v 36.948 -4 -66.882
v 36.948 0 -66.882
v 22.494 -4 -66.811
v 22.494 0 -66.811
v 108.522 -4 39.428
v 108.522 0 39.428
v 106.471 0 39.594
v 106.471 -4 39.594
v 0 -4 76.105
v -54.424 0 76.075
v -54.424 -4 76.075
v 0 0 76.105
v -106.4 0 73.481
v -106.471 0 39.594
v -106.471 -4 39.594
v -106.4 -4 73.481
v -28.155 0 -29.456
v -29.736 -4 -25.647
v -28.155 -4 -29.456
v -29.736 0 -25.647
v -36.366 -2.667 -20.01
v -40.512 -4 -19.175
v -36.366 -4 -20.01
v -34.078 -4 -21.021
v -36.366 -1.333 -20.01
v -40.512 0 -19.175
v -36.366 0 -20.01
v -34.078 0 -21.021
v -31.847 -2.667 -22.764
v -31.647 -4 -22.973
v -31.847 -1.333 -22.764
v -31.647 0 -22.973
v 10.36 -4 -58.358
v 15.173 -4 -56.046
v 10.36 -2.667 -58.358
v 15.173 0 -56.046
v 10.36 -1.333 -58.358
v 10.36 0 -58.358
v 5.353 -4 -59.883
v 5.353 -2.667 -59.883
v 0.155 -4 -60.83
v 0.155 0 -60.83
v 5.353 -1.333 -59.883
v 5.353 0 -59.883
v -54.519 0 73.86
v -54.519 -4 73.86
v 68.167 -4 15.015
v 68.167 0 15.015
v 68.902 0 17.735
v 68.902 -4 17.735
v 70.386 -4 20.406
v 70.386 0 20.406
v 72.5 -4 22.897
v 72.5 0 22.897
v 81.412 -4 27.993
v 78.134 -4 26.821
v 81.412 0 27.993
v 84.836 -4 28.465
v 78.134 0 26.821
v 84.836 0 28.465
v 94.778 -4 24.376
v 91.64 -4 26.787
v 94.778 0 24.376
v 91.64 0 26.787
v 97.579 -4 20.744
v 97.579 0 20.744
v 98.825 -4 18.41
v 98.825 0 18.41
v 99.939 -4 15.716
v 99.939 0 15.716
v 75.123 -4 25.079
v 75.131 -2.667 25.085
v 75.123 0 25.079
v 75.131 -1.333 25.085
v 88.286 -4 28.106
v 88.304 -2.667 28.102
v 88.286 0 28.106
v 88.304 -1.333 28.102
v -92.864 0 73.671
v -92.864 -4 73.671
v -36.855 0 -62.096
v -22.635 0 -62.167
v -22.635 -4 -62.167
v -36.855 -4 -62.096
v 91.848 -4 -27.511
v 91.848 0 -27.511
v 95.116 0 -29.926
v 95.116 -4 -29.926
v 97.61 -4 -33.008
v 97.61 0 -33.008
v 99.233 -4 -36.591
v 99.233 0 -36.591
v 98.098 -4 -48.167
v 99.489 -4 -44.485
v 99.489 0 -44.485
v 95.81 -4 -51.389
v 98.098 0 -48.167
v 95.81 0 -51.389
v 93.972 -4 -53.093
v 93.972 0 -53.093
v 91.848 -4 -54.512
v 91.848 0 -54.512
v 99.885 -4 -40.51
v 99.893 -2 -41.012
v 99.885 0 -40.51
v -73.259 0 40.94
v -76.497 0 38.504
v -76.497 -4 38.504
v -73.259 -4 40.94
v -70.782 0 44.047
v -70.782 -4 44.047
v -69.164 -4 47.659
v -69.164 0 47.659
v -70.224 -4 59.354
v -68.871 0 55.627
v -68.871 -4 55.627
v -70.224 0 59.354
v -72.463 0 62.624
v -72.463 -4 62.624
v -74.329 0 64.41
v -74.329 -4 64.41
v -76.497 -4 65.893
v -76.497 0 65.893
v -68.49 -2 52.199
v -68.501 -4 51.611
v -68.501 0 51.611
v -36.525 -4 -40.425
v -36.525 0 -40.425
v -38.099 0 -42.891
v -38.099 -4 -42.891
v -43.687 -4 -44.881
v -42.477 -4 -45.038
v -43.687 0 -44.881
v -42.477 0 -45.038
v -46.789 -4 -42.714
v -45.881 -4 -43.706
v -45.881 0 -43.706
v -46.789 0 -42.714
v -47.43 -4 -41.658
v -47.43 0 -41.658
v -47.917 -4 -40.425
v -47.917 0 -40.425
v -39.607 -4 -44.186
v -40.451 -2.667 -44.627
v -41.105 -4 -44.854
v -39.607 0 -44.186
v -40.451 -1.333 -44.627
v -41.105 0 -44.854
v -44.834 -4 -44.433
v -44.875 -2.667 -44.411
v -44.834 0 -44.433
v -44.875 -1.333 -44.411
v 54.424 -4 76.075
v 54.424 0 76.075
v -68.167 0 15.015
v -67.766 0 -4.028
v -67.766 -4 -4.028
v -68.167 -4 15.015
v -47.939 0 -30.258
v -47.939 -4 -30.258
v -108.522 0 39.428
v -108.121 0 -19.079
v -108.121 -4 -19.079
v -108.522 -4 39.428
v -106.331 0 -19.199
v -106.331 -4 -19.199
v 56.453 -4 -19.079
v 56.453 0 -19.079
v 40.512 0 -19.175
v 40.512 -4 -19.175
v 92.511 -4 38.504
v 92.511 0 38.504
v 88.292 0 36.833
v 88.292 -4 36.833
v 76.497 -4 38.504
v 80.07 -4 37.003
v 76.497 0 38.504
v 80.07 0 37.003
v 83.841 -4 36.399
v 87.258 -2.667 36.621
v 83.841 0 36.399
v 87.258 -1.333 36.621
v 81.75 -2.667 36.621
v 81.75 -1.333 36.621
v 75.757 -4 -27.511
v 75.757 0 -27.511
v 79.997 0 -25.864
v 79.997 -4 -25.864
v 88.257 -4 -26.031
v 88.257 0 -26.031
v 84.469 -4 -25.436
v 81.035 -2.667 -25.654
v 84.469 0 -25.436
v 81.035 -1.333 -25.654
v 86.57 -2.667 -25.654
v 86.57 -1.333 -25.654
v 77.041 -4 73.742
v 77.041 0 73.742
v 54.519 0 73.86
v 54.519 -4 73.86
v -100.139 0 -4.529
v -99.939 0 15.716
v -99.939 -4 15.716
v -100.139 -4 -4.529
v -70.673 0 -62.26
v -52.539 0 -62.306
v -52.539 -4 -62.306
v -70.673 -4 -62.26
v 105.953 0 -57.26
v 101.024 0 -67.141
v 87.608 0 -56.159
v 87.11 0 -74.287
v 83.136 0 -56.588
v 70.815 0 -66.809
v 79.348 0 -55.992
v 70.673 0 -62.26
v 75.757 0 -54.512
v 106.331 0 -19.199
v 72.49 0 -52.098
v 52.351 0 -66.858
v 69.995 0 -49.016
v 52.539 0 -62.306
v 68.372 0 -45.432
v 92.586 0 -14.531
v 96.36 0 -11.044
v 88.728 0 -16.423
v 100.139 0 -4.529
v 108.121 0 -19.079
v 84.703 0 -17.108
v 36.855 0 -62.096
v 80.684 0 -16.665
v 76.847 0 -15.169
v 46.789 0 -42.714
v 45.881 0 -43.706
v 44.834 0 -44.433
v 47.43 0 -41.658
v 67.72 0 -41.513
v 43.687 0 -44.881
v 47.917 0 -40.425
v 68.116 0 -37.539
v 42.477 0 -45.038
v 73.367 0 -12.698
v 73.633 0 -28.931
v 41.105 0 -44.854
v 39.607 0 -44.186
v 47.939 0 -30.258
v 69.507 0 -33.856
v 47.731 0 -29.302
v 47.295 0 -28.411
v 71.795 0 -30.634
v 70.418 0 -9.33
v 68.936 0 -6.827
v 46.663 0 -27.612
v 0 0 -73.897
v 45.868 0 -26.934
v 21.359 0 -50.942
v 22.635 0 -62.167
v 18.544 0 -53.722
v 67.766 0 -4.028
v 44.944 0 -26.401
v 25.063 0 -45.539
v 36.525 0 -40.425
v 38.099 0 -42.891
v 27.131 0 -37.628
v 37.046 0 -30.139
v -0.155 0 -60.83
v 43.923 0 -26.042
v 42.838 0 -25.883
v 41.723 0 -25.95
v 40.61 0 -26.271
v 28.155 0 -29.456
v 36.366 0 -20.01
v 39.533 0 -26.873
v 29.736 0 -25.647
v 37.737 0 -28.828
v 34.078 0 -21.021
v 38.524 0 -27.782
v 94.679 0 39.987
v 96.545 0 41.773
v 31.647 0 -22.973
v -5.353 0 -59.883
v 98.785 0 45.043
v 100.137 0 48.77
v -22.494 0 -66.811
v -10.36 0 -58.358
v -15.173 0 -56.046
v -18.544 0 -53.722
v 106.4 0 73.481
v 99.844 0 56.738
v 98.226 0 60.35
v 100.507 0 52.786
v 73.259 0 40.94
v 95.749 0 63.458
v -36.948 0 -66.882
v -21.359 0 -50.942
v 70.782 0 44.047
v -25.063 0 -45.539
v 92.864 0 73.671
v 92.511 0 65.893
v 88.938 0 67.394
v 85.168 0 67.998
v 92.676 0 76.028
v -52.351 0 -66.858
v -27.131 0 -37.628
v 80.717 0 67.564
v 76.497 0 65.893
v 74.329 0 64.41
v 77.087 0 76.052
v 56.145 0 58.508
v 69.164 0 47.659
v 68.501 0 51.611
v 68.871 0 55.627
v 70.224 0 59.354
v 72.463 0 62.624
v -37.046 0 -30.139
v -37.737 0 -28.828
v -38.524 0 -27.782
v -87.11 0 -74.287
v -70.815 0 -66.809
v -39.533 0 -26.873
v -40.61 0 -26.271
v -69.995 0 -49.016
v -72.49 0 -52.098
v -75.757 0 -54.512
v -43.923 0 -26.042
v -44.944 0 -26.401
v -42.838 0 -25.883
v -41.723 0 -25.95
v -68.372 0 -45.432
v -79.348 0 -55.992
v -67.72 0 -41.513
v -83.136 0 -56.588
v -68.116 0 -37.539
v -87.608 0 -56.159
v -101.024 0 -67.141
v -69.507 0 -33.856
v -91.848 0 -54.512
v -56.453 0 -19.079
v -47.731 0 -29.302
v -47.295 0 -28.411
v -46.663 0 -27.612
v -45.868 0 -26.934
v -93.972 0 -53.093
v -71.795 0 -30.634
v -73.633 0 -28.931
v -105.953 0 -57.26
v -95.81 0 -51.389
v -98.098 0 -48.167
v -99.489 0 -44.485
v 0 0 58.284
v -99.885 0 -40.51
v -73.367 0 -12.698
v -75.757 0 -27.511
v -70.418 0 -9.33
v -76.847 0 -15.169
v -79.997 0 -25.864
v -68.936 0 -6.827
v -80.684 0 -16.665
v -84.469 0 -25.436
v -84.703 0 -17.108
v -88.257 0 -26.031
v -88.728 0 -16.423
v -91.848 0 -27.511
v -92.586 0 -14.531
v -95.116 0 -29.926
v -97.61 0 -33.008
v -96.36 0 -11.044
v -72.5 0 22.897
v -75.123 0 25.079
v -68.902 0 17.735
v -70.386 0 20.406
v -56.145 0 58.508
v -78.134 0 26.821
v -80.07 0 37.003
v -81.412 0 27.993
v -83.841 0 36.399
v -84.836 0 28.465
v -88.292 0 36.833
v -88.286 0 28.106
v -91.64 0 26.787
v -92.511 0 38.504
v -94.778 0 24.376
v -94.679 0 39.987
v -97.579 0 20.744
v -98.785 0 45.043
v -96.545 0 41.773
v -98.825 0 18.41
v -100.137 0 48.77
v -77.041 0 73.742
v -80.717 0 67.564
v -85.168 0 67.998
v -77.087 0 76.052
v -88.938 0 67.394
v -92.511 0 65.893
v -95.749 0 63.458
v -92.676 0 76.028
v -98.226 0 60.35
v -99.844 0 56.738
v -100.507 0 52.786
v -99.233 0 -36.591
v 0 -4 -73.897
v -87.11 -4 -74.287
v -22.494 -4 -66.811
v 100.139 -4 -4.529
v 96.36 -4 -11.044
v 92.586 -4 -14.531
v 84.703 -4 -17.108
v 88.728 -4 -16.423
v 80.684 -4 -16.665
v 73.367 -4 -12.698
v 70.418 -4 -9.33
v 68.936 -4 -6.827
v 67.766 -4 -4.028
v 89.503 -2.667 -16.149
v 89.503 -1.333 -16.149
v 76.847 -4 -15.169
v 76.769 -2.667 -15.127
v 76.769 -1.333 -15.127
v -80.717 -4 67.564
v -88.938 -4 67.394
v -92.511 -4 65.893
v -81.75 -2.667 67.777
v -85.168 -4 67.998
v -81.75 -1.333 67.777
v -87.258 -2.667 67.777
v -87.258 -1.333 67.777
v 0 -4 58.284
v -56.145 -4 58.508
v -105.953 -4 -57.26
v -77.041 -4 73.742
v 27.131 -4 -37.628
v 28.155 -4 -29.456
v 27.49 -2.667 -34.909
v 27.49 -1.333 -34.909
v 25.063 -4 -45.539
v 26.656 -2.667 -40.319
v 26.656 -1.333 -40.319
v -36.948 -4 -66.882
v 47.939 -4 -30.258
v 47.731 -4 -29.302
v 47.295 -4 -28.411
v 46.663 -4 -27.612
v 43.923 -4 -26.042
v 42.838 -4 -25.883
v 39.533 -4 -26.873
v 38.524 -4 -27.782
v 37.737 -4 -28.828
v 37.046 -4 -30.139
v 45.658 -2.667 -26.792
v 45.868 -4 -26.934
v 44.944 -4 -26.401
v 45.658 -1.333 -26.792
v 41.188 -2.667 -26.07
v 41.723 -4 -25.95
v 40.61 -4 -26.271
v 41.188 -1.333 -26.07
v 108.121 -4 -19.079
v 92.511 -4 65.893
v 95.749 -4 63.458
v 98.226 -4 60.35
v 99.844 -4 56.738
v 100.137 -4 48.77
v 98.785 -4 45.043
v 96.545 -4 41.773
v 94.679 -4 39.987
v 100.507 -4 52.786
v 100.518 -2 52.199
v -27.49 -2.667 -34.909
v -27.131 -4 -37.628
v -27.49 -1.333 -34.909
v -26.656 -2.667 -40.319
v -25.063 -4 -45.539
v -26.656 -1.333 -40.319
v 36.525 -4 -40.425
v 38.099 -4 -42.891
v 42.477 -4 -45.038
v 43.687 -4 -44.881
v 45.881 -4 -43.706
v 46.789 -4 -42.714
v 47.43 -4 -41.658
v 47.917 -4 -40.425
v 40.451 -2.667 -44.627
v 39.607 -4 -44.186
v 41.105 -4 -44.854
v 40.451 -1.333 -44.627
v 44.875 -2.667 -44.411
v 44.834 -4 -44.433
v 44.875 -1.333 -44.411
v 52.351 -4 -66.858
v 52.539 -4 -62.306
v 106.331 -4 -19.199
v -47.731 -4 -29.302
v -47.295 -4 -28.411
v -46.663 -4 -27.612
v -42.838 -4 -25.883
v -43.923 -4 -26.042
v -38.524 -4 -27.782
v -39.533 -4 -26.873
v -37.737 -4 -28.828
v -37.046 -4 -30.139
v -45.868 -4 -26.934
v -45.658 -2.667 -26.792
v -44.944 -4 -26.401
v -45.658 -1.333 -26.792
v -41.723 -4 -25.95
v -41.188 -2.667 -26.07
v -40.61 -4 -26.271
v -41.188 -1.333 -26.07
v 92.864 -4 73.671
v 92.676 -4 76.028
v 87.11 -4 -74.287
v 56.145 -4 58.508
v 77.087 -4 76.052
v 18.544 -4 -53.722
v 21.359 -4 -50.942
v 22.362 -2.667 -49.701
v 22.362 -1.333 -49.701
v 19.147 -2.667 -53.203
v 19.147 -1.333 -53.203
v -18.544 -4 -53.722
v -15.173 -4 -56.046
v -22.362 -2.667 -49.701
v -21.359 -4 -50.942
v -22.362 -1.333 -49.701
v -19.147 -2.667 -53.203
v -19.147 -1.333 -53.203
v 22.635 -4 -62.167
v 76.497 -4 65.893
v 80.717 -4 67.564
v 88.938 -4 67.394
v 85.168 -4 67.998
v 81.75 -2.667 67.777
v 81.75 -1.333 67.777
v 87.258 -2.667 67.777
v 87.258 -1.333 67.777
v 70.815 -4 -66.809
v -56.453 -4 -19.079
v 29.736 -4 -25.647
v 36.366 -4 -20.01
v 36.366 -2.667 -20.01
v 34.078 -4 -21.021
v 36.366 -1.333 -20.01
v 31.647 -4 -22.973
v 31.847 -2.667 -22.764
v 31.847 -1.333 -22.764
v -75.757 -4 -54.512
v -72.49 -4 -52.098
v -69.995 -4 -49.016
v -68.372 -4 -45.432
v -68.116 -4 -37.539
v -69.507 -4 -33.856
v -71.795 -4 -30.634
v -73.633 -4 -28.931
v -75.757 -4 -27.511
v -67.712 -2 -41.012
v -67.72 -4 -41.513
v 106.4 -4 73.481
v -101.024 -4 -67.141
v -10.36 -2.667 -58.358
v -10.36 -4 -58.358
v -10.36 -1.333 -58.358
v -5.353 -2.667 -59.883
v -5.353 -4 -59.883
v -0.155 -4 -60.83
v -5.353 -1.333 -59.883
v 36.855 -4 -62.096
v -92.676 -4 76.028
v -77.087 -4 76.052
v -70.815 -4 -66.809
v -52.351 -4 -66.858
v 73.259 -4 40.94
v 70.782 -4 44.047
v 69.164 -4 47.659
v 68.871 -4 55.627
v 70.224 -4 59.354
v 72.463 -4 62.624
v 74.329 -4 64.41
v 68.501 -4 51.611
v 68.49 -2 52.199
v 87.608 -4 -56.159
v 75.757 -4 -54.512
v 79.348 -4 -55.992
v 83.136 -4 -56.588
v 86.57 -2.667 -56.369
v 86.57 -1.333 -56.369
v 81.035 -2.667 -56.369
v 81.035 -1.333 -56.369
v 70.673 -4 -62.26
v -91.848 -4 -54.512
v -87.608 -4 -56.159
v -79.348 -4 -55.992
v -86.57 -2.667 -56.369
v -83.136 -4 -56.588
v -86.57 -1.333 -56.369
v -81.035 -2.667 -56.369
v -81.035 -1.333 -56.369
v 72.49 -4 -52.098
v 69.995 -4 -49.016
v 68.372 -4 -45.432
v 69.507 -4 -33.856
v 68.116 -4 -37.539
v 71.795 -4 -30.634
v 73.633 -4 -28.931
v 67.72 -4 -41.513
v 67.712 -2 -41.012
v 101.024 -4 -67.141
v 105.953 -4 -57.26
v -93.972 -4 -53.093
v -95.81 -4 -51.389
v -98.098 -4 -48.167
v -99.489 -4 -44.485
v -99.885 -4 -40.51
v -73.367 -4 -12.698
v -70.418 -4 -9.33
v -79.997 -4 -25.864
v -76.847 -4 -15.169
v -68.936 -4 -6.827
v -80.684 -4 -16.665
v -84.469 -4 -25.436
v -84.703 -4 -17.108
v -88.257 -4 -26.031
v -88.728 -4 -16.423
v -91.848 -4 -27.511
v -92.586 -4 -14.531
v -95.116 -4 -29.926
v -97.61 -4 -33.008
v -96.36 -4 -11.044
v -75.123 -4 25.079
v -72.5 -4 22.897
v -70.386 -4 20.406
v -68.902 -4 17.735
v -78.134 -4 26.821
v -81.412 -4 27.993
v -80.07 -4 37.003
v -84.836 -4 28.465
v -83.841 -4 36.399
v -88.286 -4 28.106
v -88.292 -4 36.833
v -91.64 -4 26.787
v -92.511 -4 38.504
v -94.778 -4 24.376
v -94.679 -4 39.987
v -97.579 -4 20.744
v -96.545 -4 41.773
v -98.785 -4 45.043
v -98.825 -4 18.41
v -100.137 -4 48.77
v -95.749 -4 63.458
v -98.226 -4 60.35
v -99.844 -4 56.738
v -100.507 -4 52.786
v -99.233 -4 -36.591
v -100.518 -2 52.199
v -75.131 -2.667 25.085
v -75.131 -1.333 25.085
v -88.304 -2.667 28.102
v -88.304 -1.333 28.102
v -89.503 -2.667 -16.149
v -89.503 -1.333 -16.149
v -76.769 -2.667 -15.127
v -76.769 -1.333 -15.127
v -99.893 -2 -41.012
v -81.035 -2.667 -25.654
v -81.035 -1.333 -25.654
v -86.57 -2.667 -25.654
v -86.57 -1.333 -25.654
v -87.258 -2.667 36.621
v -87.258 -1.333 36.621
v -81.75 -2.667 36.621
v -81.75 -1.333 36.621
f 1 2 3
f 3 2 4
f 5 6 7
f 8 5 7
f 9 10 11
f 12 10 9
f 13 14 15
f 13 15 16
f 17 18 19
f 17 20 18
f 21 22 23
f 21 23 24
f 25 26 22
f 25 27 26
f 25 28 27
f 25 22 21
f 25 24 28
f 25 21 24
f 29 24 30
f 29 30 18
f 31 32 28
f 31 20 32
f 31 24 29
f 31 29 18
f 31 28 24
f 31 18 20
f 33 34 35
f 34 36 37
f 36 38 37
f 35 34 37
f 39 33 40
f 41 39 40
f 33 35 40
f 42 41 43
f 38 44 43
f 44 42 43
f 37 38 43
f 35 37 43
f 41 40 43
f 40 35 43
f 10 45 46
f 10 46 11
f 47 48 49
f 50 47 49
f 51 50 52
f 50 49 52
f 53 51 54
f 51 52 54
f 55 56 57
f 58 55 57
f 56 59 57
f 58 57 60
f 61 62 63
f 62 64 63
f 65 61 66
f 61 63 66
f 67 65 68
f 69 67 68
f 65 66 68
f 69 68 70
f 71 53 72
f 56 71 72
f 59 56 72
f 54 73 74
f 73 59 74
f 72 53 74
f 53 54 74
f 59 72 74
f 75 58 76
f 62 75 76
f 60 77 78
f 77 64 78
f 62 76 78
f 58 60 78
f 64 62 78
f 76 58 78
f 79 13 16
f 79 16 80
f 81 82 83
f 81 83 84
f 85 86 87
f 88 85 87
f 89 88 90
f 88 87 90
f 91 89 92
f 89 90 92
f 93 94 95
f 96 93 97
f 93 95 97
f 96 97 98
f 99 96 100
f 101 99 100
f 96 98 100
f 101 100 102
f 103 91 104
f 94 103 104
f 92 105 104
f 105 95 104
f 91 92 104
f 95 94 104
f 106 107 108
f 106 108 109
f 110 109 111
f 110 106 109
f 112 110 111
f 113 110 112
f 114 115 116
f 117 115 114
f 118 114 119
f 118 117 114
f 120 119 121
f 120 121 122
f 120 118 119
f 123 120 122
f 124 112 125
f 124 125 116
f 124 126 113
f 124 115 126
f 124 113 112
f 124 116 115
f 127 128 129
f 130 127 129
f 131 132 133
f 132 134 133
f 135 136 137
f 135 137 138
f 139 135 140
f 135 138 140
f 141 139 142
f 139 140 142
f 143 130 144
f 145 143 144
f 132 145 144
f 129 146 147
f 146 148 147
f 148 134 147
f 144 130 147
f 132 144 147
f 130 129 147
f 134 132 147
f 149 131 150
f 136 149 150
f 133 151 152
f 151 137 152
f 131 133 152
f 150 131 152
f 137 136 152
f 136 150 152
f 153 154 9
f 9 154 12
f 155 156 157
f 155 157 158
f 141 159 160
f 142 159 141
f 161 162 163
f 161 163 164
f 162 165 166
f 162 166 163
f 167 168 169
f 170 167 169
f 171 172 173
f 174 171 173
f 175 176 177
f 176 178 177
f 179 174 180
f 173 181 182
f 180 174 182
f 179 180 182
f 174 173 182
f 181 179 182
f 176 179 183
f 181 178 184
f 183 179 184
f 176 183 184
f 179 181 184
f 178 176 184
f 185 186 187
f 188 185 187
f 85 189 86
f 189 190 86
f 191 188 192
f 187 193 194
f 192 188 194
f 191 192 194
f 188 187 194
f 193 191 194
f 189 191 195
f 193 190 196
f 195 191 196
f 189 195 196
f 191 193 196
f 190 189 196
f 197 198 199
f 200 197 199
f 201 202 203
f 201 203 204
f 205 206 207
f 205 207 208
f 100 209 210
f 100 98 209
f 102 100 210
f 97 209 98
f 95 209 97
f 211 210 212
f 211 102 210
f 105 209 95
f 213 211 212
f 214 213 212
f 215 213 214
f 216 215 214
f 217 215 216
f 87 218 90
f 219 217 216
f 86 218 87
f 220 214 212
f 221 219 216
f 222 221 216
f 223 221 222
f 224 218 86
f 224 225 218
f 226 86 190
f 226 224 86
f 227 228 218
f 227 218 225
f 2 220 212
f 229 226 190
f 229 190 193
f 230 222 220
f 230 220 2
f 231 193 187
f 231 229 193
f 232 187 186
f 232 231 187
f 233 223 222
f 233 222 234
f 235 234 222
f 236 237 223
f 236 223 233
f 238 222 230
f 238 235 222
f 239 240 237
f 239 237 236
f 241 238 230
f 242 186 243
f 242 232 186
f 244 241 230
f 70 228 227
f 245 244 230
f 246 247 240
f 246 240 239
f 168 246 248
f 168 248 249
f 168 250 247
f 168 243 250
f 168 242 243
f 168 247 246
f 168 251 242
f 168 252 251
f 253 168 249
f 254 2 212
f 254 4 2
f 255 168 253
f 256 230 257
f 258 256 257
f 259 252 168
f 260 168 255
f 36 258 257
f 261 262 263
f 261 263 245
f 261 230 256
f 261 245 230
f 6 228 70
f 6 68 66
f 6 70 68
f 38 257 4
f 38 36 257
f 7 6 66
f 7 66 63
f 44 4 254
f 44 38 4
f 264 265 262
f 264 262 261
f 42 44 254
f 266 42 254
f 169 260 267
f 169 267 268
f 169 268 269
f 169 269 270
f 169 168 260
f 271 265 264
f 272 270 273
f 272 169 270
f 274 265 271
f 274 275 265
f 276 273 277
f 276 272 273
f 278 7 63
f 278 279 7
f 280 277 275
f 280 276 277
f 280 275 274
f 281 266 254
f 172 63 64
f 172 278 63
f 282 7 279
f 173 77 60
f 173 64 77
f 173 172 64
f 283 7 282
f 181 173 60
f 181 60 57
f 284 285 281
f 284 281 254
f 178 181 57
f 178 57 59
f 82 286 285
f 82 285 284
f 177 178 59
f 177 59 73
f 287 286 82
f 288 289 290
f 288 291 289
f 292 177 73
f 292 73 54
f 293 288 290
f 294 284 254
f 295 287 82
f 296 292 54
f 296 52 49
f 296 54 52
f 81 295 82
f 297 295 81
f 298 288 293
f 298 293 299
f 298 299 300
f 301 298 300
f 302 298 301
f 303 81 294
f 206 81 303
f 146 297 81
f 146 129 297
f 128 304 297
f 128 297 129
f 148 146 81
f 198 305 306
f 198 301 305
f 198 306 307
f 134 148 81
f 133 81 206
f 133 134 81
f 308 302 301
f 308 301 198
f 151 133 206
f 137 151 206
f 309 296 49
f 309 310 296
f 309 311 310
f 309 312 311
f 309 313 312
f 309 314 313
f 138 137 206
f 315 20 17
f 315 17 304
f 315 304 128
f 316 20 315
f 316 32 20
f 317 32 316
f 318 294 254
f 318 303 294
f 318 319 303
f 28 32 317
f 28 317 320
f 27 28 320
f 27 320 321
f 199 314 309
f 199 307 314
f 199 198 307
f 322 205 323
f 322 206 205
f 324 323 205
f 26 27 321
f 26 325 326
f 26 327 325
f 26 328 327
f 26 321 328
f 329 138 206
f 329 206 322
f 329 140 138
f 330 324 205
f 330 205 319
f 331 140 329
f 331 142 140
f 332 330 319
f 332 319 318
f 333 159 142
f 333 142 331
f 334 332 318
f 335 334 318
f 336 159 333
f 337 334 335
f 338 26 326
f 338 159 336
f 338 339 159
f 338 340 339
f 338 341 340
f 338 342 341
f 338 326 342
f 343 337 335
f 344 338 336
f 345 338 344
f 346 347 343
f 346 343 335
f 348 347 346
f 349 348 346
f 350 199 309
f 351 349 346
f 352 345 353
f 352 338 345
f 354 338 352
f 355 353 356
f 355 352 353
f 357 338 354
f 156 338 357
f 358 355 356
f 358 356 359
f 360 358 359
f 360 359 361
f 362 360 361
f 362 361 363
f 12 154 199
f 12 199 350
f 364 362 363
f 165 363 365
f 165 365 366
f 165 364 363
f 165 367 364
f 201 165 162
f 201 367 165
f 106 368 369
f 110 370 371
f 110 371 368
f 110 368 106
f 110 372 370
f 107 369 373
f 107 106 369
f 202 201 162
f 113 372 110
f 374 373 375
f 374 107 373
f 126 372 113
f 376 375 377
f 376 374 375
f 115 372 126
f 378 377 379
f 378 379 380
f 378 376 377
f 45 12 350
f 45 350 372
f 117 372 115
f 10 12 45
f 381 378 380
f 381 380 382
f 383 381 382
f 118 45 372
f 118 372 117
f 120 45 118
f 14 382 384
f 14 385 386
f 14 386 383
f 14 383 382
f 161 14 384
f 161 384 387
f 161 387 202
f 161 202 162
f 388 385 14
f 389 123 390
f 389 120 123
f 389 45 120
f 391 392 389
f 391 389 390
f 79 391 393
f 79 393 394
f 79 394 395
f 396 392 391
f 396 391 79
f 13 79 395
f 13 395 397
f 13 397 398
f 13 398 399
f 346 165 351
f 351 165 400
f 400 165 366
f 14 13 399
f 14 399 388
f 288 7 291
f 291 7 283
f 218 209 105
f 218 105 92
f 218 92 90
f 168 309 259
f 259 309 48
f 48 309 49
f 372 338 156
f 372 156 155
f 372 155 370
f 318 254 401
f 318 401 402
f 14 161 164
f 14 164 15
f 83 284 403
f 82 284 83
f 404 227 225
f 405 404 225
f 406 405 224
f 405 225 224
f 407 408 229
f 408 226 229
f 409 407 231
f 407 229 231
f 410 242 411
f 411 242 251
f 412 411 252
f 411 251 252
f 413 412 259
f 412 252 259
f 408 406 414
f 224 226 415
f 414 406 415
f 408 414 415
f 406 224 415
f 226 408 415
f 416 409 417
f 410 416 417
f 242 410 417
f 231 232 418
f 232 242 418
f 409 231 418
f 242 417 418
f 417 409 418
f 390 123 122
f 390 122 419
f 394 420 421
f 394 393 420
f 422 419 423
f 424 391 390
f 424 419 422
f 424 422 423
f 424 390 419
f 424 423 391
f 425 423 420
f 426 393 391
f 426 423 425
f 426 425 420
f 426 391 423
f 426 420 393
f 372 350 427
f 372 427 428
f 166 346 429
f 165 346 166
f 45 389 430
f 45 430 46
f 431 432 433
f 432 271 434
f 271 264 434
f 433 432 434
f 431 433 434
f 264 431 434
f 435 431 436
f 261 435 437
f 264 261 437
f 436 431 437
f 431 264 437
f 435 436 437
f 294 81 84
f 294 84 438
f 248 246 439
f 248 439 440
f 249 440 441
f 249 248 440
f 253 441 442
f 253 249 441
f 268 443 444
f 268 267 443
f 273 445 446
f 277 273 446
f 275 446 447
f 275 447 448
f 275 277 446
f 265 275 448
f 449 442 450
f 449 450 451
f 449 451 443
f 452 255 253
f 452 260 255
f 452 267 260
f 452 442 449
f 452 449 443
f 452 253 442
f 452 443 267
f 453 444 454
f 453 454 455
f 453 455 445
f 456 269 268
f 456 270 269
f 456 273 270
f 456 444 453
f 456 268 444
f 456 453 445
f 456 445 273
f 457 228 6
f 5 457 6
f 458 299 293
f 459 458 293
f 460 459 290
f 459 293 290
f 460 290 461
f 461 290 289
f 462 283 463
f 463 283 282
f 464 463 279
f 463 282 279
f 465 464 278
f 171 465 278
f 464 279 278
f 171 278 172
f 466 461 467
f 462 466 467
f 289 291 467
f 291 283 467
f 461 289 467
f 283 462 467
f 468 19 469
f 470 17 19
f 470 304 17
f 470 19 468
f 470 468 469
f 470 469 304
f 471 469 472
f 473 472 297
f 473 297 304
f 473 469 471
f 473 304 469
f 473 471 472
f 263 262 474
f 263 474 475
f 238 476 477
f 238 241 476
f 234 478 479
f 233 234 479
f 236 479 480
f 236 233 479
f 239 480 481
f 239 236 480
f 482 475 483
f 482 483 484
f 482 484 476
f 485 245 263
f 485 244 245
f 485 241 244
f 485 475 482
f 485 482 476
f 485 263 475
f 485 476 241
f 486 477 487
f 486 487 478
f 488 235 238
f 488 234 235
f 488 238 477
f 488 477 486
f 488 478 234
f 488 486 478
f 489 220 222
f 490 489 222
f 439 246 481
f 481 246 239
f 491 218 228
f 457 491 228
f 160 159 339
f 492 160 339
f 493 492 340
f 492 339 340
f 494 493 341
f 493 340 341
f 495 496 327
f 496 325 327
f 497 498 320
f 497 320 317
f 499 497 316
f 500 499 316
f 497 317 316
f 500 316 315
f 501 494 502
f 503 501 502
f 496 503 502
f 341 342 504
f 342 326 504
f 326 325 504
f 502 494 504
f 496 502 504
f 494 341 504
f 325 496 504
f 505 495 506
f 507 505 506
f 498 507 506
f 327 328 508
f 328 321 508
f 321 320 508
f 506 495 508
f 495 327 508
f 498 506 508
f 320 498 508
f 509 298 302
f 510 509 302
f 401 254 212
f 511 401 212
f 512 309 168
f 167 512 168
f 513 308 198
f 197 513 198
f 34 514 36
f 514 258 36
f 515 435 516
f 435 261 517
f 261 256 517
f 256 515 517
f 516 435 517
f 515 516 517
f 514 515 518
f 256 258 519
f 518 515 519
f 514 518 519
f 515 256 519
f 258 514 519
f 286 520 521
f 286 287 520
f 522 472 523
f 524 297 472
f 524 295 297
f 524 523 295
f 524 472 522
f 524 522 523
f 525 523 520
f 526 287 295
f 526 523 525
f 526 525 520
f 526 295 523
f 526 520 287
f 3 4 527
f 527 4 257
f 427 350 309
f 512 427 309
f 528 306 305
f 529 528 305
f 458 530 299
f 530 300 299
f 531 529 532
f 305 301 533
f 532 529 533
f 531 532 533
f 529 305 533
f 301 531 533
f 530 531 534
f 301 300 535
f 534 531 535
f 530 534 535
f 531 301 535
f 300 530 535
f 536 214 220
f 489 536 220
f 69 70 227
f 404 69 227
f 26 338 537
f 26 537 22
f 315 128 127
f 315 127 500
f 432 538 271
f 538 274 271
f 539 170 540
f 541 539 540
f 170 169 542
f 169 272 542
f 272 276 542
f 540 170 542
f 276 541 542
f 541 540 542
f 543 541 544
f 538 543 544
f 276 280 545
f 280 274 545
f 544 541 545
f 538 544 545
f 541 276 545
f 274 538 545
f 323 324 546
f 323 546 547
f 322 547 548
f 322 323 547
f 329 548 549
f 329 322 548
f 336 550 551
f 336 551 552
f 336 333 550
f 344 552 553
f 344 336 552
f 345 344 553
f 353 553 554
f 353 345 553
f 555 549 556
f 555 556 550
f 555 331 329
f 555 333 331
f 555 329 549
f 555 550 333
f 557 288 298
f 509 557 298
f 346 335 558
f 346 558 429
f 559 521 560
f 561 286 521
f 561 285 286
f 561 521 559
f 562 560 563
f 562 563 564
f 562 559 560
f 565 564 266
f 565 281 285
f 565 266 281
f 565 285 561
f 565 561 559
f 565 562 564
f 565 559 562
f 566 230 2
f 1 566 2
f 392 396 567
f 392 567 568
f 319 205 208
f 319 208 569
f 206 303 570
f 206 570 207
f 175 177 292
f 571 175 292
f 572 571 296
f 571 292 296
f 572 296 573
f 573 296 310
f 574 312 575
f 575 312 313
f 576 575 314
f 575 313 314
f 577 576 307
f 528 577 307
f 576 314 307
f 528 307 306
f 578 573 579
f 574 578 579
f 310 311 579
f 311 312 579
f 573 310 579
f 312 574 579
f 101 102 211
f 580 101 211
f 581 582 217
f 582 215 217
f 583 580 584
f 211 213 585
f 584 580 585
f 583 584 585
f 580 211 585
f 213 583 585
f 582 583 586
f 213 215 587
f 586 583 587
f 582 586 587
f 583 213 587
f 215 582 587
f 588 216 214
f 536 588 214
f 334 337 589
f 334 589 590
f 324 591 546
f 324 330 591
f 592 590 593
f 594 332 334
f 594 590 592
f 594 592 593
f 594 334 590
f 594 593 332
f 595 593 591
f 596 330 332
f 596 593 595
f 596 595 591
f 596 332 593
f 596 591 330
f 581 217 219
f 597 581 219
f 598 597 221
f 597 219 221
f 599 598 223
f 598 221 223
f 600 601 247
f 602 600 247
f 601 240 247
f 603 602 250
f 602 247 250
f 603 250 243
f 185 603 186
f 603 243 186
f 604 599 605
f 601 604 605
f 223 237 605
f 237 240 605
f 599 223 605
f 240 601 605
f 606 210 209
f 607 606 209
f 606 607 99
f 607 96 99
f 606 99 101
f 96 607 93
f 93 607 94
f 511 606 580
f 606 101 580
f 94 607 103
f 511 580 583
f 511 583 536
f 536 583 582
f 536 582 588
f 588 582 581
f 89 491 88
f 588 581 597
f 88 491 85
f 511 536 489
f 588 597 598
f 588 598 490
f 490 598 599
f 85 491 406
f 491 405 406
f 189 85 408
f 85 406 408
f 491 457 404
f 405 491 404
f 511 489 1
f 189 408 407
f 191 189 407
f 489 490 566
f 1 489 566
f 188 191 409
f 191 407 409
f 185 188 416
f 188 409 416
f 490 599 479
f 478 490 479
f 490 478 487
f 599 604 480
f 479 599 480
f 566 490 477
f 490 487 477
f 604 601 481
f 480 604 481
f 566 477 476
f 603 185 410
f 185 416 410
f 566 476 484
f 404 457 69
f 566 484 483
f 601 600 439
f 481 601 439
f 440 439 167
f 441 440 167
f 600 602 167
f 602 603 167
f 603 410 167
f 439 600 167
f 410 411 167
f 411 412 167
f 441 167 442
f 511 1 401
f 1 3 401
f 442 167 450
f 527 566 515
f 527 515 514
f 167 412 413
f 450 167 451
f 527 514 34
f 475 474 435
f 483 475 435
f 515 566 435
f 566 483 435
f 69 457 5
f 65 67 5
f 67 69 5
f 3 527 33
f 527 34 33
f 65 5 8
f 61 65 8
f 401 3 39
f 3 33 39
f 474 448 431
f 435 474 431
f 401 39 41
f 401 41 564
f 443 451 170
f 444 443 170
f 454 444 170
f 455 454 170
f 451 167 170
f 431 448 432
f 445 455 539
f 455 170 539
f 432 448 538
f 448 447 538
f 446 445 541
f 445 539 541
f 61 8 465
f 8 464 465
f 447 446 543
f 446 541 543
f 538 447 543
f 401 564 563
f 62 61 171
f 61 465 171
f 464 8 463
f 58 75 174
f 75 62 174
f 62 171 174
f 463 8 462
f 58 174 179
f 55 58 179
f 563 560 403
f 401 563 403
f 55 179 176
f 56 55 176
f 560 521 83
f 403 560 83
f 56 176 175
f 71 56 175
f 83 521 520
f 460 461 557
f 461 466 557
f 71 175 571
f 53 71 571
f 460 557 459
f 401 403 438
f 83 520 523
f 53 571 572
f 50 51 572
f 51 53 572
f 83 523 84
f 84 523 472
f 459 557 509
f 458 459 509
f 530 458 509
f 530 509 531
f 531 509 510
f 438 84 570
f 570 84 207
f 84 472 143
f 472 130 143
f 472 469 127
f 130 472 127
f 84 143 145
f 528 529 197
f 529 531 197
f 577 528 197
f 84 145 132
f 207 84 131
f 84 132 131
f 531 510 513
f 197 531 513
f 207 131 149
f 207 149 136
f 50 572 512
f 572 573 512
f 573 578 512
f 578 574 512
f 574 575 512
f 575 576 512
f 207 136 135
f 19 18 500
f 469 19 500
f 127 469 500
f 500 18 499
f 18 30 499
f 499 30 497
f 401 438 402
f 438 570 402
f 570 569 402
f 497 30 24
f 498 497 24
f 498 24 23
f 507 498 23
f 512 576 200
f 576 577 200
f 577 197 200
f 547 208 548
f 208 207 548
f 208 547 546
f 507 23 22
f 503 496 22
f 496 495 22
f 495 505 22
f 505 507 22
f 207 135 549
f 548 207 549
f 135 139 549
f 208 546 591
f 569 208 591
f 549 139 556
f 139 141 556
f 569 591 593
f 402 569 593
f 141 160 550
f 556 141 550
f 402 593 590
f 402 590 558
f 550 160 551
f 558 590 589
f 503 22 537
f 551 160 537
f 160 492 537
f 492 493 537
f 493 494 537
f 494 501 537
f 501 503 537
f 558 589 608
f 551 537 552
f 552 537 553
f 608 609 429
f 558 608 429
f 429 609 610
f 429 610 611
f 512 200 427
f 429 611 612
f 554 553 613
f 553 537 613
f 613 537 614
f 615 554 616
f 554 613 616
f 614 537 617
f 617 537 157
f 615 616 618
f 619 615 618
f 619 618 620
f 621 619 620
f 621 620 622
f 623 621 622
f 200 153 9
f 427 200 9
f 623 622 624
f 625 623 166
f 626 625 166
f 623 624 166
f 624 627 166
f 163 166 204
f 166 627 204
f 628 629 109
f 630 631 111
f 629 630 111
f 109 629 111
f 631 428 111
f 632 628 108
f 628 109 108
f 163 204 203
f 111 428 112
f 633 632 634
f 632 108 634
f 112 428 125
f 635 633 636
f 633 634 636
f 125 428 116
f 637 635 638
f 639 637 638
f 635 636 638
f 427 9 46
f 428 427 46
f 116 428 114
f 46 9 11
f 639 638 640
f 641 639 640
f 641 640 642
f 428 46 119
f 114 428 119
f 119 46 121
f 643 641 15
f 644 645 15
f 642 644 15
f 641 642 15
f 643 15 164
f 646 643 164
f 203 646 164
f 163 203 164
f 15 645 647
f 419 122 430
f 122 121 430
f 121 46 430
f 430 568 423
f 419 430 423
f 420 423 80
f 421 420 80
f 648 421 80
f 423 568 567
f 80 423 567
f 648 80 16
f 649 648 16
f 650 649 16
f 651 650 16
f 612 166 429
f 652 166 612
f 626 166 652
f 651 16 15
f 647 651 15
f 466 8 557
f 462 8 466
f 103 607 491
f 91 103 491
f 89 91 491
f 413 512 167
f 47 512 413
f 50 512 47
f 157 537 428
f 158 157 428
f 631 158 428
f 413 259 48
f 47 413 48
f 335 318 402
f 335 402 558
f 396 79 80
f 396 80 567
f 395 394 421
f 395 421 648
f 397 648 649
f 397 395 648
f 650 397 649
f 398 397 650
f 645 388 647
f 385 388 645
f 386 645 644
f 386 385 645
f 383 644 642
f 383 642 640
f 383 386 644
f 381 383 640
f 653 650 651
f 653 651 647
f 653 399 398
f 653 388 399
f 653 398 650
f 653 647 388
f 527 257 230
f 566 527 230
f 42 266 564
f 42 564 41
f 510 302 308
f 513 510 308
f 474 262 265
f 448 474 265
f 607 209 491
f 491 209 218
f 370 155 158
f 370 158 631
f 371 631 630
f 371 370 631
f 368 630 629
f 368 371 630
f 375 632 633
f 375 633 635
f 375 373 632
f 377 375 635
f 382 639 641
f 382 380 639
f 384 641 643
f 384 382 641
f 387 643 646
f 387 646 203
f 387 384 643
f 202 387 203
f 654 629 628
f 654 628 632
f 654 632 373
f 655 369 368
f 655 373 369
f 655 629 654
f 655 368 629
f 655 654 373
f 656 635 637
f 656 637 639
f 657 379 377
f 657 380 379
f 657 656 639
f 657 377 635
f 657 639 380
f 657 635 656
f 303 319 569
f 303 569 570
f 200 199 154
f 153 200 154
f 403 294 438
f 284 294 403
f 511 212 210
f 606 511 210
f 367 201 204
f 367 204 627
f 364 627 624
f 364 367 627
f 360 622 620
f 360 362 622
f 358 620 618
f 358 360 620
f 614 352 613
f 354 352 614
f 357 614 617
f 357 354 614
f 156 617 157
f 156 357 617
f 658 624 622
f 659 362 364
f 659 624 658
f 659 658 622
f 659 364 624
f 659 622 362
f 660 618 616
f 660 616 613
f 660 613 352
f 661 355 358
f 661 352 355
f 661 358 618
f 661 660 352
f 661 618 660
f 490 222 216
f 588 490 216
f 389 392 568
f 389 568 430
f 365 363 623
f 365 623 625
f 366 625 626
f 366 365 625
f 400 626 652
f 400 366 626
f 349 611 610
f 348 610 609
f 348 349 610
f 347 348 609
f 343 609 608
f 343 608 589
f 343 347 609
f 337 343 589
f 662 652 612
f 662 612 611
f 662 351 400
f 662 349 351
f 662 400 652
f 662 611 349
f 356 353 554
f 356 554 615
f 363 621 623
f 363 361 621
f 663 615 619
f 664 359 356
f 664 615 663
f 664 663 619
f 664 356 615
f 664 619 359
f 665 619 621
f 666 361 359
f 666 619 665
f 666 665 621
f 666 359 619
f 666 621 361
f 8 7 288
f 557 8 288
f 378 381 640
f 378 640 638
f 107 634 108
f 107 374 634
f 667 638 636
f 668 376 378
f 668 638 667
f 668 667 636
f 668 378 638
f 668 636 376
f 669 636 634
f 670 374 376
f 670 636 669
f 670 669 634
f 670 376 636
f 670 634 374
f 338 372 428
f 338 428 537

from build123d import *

# Parameters (mm, degrees)
F1_DEPTH = 4


# Not quite as in the source:
# - ends of sketch curves that miss each other by under 0.0002 mm in the source are joined


with BuildPart() as f1:
    # F0 (on Front) → F1 (new body)
    with BuildSketch(Plane.XZ):
        with BuildLine():
            Line((0, -60.8297549188), (0, -73.8967955112))
            Line((0, -73.8967955112), (87.1100496289, -74.2867405805))
            Line((87.1100496289, -74.2867405805), (101.0242826289, -67.1413325805))
            Line((101.0242826289, -67.1413325805), (105.9525546289, -57.2604655805))
            Line((105.9525546289, -57.2604655805), (106.3312226289, -19.1988875805))
            Line((106.3312226289, -19.1988875805), (108.1210446289, -19.0793755805))
            Line((108.1210446289, -19.0793755805), (108.5219496289, 39.4283344195))
            Line((108.5219496289, 39.4283344195), (106.4708796289, 39.5943924195))
            Line((106.4708796289, 39.5943924195), (106.4000046289, 73.4808784195))
            Line((106.4000046289, 73.4808784195), (92.8644466289, 73.6712574195))
            Line((92.8644466289, 73.6712574195), (92.6761516289, 76.0280454195))
            Line((92.6761516289, 76.0280454195), (77.0874396289, 76.0523674195))
            Line((77.0874396289, 76.0523674195), (77.0408646289, 73.7421304195))
            Line((77.0408646289, 73.7421304195), (54.5193526289, 73.8595534195))
            Line((54.5193526289, 73.8595534195), (54.4241656289, 76.0746004195))
            Line((54.4241656289, 76.0746004195), (0, 76.1053934693))
            Line((0, 76.1053934693), (0, 58.2839623094))
            Line((0, 58.2839623094), (56.1452326289, 58.5077654195))
            Line((56.1452326289, 58.5077654195), (56.4530356289, -19.0793755805))
            Line((56.4530356289, -19.0793755805), (40.5120526289, -19.1745575805))
            add(Edge.make_bspline(
                [(40.5120526289, -19.1745575805), (36.9506296289, -19.7234595805), (31.0349826289, -20.1211625805), (28.1548906289, -29.4563295805)],
                knots=[0, 0, 0, 0, 1, 1, 1, 1], degree=3))
            add(Edge.make_bspline(
                [(28.1548906289, -29.4563295805), (27.3785236289, -34.8808025805), (27.2311746289, -40.4625355805), (25.0629916289, -45.5390525805)],
                knots=[0, 0, 0, 0, 1, 1, 1, 1], degree=3))
            add(Edge.make_bspline(
                [(25.0629916289, -45.5390525805), (22.5362476289, -50.0321895805), (19.6081916289, -53.5319905805), (15.1727896289, -56.0456005805)],
                knots=[0, 0, 0, 0, 1, 1, 1, 1], degree=3))
            add(Edge.make_bspline(
                [(15.1727896289, -56.0456005805), (10.4594036477, -58.820394717), (5.445743624, -60.1029114405), (0.1550796733, -60.8297549188)],
                knots=[0, 0, 0, 0, 0.9984504356, 0.9984504356, 0.9984504356, 0.9984504356], degree=3))
            Line((0.1550796733, -60.8297549188), (0, -60.8297549188))
        make_face()
        Polygon((22.4935926289, -66.8113025805), (22.6353336289, -62.1665075805), (36.8552756289, -62.0956475805), (36.9483786289, -66.8821775805), align=None, mode=Mode.SUBTRACT)
        with BuildLine():
            Line((36.5252426289, -40.4245775805), (37.0456556289, -30.1386355805))
            add(Edge.make_bspline(
                [(47.9388526289, -30.2581405805), (47.5903856289, -26.1010925805), (40.1854096289, -22.9941275805), (37.0456556289, -30.1386355805)],
                knots=[0, 0, 0, 0, 1, 1, 1, 1], degree=3))
            Line((47.9388526289, -30.2581405805), (47.9166236289, -40.4245775805))
            add(Edge.make_bspline(
                [(36.5252426289, -40.4245775805), (39.5748886289, -47.0515105805), (46.1937256289, -46.0800805805), (47.9166236289, -40.4245775805)],
                knots=[0, 0, 0, 0, 1, 1, 1, 1], degree=3))
        make_face(mode=Mode.SUBTRACT)
        Polygon((52.3508896289, -66.8578555805), (52.5391806289, -62.3061655805), (70.6729776289, -62.2595755805), (70.8147186289, -66.8091795805), align=None, mode=Mode.SUBTRACT)
        with BuildLine():
            add(Edge.make_bspline(
                [(91.8478096289, -27.5109605805), (96.8262026289, -30.2957185805), (99.8930176289, -35.4421625805), (99.8930176289, -41.0116775805)],
                knots=[0, 0, 0, 0, 1, 1, 1, 1], degree=3))
            add(Edge.make_bspline(
                [(99.8930176289, -41.0116775805), (99.8930176289, -46.5811925805), (96.8262026289, -51.7276365805), (91.8478096289, -54.5123945805)],
                knots=[0, 0, 0, 0, 1, 1, 1, 1], degree=3))
            add(Edge.make_bspline(
                [(91.8478096289, -54.5123945805), (86.8694176289, -57.2971515805), (80.7357866289, -57.2971515805), (75.7573936289, -54.5123945805)],
                knots=[0, 0, 0, 0, 1, 1, 1, 1], degree=3))
            add(Edge.make_bspline(
                [(75.7573936289, -54.5123945805), (70.7790016289, -51.7276365805), (67.7121856289, -46.5811925805), (67.7121856289, -41.0116775805)],
                knots=[0, 0, 0, 0, 1, 1, 1, 1], degree=3))
            add(Edge.make_bspline(
                [(67.7121856289, -41.0116775805), (67.7121856289, -35.4421625805), (70.7790016289, -30.2957185805), (75.7573936289, -27.5109605805)],
                knots=[0, 0, 0, 0, 1, 1, 1, 1], degree=3))
            add(Edge.make_bspline(
                [(75.7573936289, -27.5109605805), (80.7357866289, -24.7262035805), (86.8694176289, -24.7262035805), (91.8478096289, -27.5109605805)],
                knots=[0, 0, 0, 0, 1, 1, 1, 1], degree=3))
        make_face(mode=Mode.SUBTRACT)
        with BuildLine():
            add(Edge.make_bspline(
                [(68.1673266289, 15.0146874195), (69.4436526289, 25.8273554195), (91.6549896289, 38.5868954195), (99.9389866289, 15.7162674195)],
                knots=[0, 0, 0, 0, 1, 1, 1, 1], degree=3))
            Line((99.9389866289, 15.7162674195), (100.1394466289, -4.5293975805))
            add(Edge.make_bspline(
                [(100.1394466289, -4.5293975805), (92.4962496289, -23.3266025805), (72.9593576289, -19.3084625805), (67.7664206289, -4.0282625805)],
                knots=[0, 0, 0, 0, 1, 1, 1, 1], degree=3))
            Line((67.7664206289, -4.0282625805), (68.1673266289, 15.0146874195))
        make_face(mode=Mode.SUBTRACT)
        with BuildLine():
            add(Edge.make_bspline(
                [(92.5110916289, 65.8933484195), (97.4657886289, 63.0685594195), (100.5180086289, 57.8481334195), (100.5180086289, 52.1985554195)],
                knots=[0, 0, 0, 0, 1, 1, 1, 1], degree=3))
            add(Edge.make_bspline(
                [(100.5180086289, 52.1985554195), (100.5180086289, 46.5489774195), (97.4657886289, 41.3285514195), (92.5110916289, 38.5037624195)],
                knots=[0, 0, 0, 0, 1, 1, 1, 1], degree=3))
            add(Edge.make_bspline(
                [(92.5110916289, 38.5037624195), (87.5563936289, 35.6789734195), (81.4519556289, 35.6789734195), (76.4972576289, 38.5037624195)],
                knots=[0, 0, 0, 0, 1, 1, 1, 1], degree=3))
            add(Edge.make_bspline(
                [(76.4972576289, 38.5037624195), (71.5425606289, 41.3285514195), (68.4903406289, 46.5489774195), (68.4903406289, 52.1985554195)],
                knots=[0, 0, 0, 0, 1, 1, 1, 1], degree=3))
            add(Edge.make_bspline(
                [(68.4903406289, 52.1985554195), (68.4903406289, 57.8481334195), (71.5425606289, 63.0685594195), (76.4972576289, 65.8933484195)],
                knots=[0, 0, 0, 0, 1, 1, 1, 1], degree=3))
            add(Edge.make_bspline(
                [(76.4972576289, 65.8933484195), (81.4519556289, 68.7181374195), (87.5563936289, 68.7181374195), (92.5110916289, 65.8933484195)],
                knots=[0, 0, 0, 0, 1, 1, 1, 1], degree=3))
        make_face(mode=Mode.SUBTRACT)
    extrude(amount=F1_DEPTH)

    # F2: F1 across plane


with BuildPart() as f1_1:
    add(f1.part)
    add(f1.part.mirror(Plane.YZ))


solid = f1_1.part
